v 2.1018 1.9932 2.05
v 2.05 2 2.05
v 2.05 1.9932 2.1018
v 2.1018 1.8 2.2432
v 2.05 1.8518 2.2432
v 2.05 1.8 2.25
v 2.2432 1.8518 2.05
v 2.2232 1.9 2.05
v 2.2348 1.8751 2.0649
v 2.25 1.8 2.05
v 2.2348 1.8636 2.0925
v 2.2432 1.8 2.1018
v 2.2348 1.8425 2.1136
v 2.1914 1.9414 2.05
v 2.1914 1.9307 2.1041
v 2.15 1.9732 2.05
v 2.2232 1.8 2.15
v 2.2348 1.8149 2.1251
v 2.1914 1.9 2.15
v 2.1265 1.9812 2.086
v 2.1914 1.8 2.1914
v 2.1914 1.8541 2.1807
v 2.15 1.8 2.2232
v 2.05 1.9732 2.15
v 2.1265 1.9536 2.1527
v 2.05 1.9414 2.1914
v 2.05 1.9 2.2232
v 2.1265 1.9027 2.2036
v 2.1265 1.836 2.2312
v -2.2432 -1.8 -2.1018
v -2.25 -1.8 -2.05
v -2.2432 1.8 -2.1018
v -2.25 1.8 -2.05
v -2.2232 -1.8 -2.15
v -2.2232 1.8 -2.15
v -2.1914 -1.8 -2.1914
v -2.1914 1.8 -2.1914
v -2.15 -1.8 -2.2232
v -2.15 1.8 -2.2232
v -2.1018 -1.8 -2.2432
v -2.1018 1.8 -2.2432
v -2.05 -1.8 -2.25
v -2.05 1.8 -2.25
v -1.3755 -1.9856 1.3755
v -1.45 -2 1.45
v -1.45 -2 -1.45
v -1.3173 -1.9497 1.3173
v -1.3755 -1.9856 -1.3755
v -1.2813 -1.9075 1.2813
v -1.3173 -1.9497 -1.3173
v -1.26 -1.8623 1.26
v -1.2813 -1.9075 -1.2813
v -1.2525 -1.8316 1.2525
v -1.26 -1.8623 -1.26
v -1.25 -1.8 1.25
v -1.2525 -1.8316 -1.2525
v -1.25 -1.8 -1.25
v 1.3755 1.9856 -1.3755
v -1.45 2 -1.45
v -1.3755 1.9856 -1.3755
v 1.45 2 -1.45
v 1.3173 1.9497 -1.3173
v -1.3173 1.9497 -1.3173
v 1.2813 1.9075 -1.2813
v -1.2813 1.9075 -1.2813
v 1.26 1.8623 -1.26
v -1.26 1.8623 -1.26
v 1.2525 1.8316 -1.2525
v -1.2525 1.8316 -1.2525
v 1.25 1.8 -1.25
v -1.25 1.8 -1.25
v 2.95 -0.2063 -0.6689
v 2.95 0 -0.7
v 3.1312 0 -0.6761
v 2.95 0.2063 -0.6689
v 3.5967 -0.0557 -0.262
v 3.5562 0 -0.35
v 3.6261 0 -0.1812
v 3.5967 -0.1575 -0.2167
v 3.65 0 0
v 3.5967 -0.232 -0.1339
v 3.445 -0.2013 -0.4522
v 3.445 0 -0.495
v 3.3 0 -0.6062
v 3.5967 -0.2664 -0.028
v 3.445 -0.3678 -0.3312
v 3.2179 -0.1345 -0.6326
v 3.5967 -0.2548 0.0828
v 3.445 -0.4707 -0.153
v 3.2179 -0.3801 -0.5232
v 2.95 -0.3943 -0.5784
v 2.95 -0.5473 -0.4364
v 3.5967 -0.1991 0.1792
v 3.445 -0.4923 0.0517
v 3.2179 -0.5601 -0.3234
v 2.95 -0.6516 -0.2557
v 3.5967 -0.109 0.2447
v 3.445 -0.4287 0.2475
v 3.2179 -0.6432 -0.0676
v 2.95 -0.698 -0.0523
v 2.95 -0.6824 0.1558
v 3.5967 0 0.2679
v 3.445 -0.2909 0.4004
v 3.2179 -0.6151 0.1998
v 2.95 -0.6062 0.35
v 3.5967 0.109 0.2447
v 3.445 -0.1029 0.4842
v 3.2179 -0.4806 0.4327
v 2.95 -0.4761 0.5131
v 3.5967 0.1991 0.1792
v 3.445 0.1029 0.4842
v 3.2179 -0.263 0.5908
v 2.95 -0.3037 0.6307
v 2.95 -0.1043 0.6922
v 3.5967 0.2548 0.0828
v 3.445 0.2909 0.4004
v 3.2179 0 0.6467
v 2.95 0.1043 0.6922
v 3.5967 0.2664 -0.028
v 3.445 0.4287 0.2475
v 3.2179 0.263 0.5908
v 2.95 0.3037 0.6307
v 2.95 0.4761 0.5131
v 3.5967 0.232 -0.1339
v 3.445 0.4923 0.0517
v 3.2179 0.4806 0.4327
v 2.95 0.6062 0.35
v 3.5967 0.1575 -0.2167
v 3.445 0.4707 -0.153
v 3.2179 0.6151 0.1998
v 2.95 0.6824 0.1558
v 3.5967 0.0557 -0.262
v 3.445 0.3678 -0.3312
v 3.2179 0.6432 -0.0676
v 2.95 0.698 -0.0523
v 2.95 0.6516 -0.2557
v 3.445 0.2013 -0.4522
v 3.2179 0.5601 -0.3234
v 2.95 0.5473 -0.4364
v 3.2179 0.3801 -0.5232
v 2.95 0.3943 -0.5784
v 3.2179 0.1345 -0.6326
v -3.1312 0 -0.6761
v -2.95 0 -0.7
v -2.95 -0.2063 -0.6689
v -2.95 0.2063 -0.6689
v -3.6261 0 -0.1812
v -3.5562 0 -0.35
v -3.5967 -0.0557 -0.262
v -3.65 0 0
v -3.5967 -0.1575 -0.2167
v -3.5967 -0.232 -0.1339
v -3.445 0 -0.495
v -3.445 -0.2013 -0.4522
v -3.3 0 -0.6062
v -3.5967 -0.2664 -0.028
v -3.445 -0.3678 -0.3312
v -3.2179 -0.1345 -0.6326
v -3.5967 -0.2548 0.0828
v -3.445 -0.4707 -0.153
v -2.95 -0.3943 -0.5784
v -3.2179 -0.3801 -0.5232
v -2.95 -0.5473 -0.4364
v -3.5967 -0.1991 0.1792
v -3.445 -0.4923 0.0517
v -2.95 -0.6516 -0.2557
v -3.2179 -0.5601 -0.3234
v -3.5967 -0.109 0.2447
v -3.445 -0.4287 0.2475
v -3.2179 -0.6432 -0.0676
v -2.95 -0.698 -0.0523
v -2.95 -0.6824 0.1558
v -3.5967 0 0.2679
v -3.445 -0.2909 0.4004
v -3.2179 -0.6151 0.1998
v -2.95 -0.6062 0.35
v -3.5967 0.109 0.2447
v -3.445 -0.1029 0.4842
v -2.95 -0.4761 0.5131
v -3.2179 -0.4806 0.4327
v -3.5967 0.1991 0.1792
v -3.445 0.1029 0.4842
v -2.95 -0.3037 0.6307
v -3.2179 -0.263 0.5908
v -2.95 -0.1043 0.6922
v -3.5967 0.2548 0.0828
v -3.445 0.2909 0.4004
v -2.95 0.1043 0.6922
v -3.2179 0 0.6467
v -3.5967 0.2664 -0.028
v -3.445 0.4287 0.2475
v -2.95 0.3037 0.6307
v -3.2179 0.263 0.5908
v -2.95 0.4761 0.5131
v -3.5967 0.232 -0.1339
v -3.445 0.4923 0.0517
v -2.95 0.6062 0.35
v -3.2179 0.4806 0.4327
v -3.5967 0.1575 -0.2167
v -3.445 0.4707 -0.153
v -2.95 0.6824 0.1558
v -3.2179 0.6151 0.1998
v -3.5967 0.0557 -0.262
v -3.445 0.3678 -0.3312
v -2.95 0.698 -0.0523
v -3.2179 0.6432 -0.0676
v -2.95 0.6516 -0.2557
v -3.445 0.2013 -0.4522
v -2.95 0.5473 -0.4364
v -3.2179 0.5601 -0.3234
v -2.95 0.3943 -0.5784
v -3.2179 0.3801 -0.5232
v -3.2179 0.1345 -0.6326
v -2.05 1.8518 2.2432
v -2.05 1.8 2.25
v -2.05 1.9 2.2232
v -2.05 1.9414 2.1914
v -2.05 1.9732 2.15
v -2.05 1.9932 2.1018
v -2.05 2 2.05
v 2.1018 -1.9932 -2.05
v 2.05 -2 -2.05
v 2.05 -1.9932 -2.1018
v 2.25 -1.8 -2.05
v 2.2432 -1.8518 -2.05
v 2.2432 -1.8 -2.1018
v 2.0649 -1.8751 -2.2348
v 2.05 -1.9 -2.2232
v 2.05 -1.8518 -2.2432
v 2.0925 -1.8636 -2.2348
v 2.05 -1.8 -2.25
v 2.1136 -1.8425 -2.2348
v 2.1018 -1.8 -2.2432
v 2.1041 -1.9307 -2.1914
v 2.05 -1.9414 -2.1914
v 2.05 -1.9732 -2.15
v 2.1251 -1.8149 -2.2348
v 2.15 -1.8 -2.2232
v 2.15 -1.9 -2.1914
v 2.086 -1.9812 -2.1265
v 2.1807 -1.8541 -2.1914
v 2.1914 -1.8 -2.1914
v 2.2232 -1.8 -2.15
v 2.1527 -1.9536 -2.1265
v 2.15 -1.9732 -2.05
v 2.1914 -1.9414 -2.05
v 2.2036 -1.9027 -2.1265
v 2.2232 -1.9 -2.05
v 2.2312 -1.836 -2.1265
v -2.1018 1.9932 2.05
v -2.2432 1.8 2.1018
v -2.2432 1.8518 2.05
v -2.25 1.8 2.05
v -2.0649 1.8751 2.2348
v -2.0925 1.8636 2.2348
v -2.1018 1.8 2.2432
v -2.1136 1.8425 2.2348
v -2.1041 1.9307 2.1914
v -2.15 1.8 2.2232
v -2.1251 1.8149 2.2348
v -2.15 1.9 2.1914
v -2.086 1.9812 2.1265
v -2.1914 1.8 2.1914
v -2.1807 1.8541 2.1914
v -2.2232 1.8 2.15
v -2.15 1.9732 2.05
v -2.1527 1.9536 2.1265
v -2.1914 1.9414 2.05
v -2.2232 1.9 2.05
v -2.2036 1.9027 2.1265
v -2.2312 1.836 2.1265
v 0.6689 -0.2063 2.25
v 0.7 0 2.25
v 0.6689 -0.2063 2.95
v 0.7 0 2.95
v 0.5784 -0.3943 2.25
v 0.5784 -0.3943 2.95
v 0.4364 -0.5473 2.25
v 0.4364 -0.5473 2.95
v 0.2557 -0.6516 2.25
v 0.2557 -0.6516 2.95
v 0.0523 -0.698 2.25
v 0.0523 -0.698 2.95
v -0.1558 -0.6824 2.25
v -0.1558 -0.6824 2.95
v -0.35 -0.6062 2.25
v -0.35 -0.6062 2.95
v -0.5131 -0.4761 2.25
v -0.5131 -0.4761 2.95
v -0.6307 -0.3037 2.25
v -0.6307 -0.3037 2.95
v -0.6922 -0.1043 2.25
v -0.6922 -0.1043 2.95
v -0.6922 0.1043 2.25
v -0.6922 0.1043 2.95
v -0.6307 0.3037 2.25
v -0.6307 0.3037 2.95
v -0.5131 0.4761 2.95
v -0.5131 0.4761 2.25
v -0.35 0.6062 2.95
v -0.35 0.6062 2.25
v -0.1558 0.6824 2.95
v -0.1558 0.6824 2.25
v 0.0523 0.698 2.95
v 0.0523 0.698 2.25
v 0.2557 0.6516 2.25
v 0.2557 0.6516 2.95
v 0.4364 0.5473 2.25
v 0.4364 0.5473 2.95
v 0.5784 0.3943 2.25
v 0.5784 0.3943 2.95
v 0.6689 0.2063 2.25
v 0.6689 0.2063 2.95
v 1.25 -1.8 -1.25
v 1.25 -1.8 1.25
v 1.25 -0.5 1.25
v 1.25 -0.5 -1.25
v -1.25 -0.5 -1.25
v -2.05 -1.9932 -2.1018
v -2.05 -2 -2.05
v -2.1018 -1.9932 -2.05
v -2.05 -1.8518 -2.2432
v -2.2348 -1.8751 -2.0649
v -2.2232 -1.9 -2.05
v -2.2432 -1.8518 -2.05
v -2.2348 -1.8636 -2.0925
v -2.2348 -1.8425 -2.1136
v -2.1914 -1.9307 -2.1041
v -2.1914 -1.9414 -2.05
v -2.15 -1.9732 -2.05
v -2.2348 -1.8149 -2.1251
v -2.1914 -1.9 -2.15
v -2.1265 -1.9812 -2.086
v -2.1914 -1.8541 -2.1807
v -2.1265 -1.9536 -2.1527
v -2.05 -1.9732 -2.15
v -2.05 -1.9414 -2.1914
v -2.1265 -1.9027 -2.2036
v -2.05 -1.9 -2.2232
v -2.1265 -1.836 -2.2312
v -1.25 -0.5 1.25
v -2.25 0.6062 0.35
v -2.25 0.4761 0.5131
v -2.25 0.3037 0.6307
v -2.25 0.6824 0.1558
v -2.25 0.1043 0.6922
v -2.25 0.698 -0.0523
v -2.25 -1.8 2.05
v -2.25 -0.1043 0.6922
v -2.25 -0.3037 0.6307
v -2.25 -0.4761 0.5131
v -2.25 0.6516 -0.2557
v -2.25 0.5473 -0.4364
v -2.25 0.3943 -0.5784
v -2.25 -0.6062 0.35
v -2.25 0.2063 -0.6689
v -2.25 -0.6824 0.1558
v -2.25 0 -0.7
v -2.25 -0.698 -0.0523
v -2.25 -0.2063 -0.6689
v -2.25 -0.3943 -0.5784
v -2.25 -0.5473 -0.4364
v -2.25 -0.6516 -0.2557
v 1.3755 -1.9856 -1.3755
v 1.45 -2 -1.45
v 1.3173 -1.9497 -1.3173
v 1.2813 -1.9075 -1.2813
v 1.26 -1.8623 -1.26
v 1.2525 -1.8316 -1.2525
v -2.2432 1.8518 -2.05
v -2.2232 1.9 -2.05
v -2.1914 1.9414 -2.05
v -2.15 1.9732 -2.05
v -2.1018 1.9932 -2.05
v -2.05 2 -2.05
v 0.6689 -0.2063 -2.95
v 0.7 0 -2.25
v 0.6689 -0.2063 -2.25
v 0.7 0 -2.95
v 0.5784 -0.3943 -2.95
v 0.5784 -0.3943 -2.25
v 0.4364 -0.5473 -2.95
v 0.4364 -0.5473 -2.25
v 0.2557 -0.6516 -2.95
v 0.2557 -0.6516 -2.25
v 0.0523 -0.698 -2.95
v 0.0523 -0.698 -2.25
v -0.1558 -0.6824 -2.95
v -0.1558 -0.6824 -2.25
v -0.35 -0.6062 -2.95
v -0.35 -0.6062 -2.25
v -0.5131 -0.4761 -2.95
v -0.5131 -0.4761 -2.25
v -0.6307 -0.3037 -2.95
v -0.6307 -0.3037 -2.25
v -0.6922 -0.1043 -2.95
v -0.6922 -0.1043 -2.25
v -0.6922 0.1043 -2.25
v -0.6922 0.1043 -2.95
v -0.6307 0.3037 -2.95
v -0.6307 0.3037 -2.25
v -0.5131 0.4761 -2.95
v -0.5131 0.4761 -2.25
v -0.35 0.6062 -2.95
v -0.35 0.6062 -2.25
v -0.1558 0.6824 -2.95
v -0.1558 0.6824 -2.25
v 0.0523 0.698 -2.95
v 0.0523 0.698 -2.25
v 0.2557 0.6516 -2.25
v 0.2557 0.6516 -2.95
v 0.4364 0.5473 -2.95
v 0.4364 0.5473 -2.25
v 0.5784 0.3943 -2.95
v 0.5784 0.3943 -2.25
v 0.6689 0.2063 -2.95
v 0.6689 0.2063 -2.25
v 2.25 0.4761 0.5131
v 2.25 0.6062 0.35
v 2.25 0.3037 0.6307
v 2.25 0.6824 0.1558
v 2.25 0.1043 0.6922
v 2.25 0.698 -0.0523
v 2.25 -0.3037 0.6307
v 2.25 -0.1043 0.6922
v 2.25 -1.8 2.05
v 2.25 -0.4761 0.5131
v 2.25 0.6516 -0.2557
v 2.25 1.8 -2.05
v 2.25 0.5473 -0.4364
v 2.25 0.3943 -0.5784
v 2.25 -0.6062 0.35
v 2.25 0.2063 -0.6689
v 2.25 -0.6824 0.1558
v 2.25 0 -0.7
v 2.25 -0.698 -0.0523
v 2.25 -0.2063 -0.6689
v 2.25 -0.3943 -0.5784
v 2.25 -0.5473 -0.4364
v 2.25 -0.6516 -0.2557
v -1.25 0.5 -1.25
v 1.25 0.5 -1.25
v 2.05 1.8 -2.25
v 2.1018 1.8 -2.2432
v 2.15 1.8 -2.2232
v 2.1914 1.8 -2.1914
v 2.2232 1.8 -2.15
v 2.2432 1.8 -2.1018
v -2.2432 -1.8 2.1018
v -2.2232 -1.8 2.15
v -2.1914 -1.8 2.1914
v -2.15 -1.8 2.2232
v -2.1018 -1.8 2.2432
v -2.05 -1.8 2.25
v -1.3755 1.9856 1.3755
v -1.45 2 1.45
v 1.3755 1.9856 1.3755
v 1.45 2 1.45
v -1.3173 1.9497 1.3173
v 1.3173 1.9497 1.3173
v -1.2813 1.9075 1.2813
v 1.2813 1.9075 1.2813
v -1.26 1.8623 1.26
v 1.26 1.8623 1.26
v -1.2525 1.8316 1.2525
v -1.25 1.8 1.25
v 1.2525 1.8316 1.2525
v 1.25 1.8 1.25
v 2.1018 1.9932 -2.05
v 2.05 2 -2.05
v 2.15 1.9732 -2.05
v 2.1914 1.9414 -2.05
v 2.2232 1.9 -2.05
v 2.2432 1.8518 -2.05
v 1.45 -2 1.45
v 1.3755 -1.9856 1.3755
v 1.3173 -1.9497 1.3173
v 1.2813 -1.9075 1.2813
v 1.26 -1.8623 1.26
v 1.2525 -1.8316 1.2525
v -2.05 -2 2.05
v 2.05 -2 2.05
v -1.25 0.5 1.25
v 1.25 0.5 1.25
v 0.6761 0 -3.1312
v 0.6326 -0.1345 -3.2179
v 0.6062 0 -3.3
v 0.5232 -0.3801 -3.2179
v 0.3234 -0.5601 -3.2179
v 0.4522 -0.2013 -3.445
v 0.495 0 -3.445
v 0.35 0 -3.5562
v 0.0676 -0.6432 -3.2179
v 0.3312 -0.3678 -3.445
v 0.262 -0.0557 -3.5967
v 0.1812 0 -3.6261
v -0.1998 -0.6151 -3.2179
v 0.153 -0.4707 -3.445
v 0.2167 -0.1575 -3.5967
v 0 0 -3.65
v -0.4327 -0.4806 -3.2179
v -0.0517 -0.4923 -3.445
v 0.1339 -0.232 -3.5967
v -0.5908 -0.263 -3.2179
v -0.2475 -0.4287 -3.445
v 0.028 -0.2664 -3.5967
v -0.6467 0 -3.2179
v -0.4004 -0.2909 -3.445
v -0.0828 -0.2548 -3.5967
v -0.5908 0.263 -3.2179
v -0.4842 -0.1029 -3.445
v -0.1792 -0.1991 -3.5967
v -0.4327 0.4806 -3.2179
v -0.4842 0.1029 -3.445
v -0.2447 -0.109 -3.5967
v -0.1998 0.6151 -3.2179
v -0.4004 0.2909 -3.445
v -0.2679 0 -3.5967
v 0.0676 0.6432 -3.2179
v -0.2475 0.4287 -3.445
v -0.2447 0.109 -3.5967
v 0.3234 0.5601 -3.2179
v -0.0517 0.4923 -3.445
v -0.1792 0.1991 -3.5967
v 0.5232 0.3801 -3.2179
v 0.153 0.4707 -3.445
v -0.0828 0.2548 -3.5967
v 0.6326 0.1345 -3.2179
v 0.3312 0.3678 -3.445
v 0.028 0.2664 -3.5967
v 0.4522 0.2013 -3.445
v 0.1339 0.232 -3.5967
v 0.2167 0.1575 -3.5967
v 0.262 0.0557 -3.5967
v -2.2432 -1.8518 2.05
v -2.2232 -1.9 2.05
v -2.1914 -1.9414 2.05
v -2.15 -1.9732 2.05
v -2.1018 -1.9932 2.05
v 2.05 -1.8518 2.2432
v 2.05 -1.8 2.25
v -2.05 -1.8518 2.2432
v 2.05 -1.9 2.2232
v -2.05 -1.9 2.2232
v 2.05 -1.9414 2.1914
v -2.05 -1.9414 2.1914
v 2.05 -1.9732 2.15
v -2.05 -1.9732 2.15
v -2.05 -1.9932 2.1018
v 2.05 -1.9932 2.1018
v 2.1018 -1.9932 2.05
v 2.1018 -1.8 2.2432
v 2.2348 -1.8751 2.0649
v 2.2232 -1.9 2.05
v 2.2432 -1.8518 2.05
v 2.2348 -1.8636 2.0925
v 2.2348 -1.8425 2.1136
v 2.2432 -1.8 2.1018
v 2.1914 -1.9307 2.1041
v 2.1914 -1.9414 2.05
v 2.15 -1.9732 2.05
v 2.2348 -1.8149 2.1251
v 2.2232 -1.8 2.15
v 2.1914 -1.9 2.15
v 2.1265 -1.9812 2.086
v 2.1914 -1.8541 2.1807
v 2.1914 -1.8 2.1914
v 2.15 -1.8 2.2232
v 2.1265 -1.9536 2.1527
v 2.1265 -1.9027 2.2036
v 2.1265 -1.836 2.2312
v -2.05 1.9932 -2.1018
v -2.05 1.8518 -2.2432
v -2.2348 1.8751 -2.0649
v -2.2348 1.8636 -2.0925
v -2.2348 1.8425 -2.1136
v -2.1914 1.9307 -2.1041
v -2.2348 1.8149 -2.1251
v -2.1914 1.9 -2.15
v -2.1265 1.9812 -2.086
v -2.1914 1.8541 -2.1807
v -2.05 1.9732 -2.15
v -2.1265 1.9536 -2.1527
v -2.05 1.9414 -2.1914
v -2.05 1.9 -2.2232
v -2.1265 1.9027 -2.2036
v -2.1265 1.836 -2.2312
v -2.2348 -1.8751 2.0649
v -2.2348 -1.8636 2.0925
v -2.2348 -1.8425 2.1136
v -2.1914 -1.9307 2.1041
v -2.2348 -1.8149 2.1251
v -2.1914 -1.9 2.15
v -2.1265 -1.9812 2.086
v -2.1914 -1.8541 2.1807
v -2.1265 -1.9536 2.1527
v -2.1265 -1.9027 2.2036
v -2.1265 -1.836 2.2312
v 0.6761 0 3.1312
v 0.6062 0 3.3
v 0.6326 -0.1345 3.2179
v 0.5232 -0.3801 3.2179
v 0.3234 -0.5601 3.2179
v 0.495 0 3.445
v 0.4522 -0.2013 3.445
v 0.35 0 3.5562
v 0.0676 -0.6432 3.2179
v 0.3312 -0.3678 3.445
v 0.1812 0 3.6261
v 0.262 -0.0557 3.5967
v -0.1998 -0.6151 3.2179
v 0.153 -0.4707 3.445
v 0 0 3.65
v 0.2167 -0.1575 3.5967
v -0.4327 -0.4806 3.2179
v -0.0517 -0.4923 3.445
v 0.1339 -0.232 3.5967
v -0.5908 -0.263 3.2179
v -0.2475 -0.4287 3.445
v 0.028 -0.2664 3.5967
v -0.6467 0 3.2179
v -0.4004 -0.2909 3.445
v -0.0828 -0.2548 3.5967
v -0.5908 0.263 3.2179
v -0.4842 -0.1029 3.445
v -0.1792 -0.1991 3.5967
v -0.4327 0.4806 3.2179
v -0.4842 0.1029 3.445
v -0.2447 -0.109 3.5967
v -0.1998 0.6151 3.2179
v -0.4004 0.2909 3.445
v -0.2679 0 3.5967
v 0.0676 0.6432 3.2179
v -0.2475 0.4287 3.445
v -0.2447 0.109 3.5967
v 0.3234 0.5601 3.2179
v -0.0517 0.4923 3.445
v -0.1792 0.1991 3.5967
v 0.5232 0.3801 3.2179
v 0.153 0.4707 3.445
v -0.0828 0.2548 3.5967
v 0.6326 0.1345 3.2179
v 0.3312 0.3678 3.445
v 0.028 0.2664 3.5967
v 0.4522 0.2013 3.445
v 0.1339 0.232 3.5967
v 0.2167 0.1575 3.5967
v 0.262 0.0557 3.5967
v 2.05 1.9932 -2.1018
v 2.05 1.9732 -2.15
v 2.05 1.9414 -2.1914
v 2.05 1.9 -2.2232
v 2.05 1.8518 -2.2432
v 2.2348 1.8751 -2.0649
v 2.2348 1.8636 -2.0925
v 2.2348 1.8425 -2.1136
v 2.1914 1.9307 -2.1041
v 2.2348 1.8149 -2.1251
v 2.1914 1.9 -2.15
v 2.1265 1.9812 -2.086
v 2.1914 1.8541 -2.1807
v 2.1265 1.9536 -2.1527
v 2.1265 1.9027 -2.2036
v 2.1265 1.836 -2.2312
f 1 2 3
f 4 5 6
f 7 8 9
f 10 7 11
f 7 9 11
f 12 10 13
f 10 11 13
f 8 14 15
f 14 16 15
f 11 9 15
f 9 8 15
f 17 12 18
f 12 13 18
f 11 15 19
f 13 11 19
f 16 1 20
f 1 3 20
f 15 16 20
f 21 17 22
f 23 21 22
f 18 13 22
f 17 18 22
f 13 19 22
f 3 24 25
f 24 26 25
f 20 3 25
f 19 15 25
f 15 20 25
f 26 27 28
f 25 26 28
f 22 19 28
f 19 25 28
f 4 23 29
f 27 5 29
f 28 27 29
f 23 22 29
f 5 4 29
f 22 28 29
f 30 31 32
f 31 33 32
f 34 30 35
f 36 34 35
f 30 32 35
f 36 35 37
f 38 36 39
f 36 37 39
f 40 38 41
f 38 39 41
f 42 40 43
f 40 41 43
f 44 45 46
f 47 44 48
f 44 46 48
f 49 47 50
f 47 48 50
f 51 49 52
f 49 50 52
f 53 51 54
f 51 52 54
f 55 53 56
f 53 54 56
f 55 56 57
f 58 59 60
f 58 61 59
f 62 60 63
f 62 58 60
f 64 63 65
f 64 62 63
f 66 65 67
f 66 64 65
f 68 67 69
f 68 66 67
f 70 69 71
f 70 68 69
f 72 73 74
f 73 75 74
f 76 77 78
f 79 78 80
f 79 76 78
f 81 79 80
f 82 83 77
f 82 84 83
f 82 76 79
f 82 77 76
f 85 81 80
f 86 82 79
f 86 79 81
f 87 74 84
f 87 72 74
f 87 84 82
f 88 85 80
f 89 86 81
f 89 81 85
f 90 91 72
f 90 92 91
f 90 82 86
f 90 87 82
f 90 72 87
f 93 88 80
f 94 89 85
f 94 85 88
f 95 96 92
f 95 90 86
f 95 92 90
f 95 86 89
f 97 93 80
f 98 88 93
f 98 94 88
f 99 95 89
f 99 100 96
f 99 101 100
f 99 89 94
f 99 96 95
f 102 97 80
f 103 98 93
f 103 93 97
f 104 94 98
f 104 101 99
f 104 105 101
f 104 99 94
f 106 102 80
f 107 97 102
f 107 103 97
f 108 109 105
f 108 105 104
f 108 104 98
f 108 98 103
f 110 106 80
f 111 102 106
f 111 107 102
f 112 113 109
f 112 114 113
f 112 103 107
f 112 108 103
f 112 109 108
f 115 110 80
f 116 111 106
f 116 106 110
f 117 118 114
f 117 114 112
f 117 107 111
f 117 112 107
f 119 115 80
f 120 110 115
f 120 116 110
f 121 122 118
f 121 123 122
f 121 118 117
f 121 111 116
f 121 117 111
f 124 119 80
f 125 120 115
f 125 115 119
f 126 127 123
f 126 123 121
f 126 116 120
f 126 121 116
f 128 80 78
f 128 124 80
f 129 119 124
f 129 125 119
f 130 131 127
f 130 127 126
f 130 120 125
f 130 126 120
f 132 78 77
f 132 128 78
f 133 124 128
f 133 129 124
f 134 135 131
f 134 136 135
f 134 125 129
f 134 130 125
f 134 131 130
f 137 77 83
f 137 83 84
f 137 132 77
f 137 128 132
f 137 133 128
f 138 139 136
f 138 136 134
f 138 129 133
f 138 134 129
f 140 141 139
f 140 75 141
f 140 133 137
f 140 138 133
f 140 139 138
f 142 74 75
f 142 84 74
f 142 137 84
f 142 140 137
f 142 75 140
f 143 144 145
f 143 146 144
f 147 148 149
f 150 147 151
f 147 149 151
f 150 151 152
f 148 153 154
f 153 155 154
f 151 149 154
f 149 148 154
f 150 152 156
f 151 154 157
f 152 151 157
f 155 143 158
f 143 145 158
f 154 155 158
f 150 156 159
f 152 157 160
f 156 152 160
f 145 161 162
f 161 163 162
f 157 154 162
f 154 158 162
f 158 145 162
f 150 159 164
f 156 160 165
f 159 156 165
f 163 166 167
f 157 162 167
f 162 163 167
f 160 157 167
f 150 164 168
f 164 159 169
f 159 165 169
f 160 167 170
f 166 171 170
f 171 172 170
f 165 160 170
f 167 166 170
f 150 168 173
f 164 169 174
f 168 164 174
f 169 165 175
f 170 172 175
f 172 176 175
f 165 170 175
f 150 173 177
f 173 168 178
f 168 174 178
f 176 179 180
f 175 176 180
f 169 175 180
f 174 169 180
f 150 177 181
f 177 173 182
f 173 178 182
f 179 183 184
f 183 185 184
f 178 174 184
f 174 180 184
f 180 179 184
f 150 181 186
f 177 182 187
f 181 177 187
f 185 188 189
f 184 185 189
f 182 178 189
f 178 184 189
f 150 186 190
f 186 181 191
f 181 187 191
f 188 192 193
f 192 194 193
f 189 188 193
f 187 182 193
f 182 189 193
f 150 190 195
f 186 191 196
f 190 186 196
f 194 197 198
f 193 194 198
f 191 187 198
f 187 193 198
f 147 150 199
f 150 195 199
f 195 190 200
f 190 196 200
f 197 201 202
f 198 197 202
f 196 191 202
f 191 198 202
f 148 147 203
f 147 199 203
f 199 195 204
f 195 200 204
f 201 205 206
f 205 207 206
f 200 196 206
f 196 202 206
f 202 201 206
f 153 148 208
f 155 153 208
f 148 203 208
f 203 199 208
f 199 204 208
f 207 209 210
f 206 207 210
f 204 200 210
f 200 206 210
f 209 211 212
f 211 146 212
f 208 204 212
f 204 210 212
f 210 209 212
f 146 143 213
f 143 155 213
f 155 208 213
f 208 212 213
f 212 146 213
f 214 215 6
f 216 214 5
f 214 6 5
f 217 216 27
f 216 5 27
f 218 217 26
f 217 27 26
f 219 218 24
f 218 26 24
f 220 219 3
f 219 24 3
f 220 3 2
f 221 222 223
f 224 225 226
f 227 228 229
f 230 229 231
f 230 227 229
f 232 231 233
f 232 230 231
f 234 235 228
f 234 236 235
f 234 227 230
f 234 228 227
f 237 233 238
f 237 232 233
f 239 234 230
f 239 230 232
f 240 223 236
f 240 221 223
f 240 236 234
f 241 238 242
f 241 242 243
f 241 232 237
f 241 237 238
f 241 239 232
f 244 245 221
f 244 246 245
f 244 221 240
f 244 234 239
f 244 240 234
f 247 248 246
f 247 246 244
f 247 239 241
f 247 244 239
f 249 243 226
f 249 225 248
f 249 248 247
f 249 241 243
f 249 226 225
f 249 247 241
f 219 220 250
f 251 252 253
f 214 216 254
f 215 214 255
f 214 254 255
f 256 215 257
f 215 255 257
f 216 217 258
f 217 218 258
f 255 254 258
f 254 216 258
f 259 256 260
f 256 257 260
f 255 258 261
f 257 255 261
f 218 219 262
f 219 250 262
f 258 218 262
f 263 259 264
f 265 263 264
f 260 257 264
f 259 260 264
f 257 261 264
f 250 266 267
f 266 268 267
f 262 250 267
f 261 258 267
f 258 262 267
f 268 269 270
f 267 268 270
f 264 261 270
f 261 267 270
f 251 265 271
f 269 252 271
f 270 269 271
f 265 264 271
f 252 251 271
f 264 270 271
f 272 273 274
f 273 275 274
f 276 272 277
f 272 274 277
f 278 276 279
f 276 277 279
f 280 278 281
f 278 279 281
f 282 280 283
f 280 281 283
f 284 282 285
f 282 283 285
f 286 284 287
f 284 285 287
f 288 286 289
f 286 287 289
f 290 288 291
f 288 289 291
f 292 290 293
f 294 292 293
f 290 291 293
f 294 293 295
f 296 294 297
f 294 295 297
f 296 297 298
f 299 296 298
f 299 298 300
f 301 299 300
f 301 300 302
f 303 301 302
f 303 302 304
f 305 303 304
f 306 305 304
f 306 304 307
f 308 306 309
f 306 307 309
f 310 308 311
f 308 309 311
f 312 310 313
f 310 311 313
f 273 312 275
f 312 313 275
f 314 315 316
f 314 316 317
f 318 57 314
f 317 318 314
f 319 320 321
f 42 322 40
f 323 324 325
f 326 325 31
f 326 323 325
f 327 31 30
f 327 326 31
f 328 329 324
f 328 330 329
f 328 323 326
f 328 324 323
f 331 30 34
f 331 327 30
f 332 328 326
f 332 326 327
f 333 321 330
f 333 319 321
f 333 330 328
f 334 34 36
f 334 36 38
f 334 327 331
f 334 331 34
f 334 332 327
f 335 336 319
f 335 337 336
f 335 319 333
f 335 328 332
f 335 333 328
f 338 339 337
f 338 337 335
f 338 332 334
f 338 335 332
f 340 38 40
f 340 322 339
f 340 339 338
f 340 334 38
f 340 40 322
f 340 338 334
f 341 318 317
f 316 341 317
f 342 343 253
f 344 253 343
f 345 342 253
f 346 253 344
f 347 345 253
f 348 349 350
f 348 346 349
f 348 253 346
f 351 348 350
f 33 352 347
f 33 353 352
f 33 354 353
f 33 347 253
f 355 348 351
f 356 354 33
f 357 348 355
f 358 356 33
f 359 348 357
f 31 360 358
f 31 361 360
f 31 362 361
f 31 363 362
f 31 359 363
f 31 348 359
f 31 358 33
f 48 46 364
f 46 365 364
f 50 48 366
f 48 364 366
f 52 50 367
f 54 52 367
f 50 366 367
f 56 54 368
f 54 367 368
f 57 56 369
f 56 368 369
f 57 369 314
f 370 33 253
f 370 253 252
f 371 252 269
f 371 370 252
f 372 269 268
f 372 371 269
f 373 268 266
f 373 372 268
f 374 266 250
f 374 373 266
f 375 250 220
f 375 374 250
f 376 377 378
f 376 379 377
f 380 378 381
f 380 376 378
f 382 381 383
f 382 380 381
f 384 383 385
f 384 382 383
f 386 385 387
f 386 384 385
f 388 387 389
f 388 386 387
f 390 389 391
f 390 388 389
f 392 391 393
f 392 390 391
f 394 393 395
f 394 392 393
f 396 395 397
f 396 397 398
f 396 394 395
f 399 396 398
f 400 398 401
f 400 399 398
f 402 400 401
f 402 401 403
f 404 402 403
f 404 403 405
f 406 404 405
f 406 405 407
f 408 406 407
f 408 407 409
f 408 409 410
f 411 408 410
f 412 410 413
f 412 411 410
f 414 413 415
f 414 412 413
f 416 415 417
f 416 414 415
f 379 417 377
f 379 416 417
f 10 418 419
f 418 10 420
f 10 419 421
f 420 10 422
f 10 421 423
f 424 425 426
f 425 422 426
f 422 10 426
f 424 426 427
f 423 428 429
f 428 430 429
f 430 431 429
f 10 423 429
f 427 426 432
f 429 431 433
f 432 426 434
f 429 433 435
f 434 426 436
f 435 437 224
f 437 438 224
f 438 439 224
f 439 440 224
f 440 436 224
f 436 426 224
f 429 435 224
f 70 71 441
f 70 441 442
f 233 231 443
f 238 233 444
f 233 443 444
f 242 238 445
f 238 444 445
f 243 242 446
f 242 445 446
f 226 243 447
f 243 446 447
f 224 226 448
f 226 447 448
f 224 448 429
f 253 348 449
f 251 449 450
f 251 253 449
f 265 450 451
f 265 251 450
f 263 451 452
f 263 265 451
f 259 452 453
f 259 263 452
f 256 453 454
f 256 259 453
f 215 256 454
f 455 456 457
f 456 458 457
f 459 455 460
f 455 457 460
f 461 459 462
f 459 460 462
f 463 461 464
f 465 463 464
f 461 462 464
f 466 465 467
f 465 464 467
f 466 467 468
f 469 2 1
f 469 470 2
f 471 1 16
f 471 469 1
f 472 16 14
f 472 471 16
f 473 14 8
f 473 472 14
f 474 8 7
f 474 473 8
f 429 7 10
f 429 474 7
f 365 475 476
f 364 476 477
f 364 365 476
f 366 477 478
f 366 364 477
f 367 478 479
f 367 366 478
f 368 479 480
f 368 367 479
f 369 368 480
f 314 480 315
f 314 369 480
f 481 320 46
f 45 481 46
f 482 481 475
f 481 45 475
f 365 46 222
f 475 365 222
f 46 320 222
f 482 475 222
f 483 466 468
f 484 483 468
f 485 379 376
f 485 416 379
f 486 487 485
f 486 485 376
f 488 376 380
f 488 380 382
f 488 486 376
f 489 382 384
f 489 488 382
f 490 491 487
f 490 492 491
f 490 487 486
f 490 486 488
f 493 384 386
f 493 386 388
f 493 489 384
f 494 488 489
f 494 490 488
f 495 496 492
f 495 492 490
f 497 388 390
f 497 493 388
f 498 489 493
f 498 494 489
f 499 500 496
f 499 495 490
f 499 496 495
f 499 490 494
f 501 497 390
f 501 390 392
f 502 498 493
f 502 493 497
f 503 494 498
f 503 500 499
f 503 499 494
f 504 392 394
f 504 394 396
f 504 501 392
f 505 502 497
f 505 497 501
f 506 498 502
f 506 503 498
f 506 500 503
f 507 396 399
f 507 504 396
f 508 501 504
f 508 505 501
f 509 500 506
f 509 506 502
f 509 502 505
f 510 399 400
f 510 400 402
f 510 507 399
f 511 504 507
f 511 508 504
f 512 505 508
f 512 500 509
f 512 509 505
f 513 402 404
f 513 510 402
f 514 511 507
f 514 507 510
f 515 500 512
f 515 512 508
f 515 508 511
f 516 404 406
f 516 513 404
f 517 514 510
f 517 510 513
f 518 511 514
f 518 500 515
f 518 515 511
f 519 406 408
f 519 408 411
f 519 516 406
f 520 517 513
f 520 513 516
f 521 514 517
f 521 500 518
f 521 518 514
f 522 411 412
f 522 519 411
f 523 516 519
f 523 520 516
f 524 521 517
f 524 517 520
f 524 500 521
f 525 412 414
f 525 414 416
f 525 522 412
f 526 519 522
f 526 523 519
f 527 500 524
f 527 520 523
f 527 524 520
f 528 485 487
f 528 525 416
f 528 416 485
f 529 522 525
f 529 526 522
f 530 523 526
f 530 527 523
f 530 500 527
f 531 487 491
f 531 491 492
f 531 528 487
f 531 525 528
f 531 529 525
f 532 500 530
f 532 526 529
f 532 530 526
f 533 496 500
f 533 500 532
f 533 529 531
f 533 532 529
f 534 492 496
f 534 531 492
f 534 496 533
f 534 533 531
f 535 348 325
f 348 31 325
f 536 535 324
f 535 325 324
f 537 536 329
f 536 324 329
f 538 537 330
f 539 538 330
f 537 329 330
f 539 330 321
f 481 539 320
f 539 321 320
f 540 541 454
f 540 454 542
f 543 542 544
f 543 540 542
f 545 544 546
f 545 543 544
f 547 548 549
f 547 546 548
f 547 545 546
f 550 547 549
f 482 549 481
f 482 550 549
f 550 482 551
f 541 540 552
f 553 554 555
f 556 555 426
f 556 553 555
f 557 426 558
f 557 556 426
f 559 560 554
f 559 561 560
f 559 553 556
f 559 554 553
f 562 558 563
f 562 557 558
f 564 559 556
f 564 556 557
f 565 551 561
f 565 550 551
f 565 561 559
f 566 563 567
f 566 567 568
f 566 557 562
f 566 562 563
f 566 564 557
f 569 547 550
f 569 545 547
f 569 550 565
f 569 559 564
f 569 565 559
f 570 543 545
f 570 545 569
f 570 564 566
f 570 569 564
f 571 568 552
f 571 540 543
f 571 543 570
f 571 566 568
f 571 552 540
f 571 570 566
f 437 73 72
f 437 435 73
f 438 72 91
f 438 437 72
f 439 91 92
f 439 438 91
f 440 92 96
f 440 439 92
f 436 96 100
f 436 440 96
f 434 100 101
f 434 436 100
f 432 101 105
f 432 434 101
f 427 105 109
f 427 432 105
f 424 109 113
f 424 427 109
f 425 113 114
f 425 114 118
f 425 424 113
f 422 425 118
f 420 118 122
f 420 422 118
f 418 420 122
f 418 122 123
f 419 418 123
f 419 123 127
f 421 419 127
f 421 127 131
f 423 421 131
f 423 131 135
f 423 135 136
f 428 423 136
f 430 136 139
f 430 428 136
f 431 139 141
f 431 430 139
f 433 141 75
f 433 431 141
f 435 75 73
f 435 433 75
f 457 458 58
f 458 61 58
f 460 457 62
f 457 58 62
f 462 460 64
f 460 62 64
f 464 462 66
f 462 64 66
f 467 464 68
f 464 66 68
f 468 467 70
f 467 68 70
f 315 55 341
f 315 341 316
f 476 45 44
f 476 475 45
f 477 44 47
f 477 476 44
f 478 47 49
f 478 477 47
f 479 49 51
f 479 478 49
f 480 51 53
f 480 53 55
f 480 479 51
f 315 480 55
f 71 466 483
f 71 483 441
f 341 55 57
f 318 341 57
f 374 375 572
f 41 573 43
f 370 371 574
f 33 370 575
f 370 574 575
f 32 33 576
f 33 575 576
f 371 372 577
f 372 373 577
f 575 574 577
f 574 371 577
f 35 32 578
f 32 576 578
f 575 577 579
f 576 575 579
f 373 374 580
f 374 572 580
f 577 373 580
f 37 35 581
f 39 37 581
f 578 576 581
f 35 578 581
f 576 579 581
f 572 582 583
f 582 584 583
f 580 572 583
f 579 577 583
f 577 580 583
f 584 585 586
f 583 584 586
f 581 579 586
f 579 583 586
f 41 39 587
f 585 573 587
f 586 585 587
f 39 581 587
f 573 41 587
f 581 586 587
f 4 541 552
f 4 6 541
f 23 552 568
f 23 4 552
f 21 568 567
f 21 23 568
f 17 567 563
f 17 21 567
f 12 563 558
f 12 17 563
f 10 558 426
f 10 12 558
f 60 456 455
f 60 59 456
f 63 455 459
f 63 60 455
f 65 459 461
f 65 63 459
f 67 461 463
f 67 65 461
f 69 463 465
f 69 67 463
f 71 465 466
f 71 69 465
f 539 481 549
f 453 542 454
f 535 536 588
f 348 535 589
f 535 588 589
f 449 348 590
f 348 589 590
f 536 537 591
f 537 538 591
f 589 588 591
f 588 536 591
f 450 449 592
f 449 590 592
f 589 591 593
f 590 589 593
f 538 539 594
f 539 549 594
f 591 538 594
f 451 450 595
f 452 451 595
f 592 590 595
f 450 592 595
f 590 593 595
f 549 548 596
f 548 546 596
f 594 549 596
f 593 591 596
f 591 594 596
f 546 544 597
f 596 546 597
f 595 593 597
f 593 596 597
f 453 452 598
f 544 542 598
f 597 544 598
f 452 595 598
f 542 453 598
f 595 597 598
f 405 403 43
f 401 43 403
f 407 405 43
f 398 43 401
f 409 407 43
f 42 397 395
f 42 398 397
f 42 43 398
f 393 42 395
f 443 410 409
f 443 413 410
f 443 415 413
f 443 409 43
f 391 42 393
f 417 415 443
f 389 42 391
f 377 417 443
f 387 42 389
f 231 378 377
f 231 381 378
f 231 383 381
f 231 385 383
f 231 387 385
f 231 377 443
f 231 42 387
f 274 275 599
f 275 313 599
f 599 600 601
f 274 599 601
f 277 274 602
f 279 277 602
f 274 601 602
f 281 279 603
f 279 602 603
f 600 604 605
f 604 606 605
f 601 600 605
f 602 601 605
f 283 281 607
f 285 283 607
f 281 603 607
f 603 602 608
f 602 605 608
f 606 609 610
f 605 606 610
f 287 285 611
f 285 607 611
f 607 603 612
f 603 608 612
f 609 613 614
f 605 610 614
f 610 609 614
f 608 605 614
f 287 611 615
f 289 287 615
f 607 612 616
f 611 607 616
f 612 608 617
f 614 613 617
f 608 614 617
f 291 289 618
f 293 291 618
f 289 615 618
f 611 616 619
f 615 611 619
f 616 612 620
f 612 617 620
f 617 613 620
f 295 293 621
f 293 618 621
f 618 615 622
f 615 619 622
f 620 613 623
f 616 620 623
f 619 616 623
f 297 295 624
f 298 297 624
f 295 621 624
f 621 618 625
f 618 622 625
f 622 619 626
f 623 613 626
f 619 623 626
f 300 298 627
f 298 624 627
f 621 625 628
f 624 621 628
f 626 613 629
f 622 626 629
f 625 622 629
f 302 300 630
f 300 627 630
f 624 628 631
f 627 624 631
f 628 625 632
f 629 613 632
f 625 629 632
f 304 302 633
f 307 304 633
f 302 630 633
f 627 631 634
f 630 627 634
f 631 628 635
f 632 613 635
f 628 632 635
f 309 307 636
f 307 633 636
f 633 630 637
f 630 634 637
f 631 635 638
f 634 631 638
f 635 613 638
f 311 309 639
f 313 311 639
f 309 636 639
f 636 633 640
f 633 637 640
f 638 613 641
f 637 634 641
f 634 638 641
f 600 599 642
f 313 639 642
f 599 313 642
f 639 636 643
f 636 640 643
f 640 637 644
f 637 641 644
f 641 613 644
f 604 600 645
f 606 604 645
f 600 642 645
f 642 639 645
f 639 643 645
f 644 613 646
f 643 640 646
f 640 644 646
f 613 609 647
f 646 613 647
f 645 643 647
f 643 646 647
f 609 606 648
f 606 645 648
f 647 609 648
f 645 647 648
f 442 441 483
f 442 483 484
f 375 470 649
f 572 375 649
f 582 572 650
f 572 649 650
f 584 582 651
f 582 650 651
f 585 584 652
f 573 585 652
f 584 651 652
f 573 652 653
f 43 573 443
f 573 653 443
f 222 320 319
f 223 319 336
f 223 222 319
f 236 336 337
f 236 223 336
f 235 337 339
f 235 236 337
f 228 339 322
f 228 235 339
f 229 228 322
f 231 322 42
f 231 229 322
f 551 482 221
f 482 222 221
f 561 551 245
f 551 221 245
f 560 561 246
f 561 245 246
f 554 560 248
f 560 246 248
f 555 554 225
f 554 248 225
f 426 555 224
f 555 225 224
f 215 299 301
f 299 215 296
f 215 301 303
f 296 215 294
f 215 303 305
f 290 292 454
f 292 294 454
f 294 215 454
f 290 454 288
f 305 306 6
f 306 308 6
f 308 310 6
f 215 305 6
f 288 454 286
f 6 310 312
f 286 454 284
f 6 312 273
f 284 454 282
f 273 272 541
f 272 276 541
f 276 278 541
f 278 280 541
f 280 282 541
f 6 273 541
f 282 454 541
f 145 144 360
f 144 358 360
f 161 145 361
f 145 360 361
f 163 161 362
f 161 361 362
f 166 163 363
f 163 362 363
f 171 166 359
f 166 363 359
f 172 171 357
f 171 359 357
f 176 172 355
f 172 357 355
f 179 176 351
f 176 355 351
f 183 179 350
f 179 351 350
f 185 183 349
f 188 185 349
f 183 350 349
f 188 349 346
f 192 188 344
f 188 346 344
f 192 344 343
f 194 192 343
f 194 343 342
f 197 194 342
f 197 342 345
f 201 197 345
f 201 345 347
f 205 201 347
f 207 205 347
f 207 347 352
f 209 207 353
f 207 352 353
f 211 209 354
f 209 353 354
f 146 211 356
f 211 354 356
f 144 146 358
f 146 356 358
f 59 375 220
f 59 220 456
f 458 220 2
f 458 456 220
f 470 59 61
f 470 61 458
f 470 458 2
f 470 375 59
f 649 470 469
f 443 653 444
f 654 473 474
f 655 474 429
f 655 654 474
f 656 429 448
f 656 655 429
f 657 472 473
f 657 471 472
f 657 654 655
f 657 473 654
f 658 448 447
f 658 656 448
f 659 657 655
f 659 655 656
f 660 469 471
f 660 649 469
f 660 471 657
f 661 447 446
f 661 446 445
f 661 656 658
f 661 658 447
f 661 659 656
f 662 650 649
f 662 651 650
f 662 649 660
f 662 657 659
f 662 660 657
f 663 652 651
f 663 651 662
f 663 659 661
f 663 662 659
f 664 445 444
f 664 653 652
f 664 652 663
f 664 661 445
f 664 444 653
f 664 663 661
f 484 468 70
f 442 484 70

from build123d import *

# Parameters (mm, degrees)
EXTRUDE_1_DEPTH      = 2
EXTRUDE_1_DEPTH_BACK = 2
SKETCH_1_W           = 4.5
SKETCH_1_H           = 4.5
SKETCH_2_W           = 2.5
SKETCH_2_H           = 2.5
CUT_EXTRUDE_1_DEPTH  = 1.5
FILLET_1_R           = 0.2


with BuildPart() as part:
    # 草图1 → 凸台-拉伸1 (new, two sides: drawn at the far end of the back side and taken through both)
    with BuildSketch(Plane(origin=(0, 0, 0), x_dir=(1, 0, 0), z_dir=(0, 1, 0)).offset(-EXTRUDE_1_DEPTH_BACK)):
        Rectangle(SKETCH_1_W, SKETCH_1_H)
    extrude(amount=EXTRUDE_1_DEPTH + EXTRUDE_1_DEPTH_BACK)

    # 草图2 → 切除-拉伸1 (cut)
    with BuildSketch(Plane(origin=(0, 2, 0), x_dir=(1, 0, 0), z_dir=(0, 1, 0))):
        Rectangle(SKETCH_2_W, SKETCH_2_H)
    cut_extrude_1 = extrude(amount=-CUT_EXTRUDE_1_DEPTH, mode=Mode.SUBTRACT)

    # 镜向1: 切除-拉伸1 across plane
    add(cut_extrude_1.mirror(Plane.ZX), mode=Mode.SUBTRACT)

    # 草图3 → 旋转1 (revolve)
    with BuildSketch(Plane(origin=(0, 0, 0), x_dir=(1, 0, 0), z_dir=(0, 1, 0))):
        with BuildLine():
            Line((0, 2.25), (-0.7, 2.25))
            Line((-0.7, 2.25), (-0.7, 2.95))
            ThreePointArc((-0.7, 2.95), (-0.494974747, 3.444974747), (0, 3.65))
            Line((0, 3.65), (0, 2.95))
            Line((0, 2.95), (0, 2.25))
        make_face()
    revolve_1 = revolve(axis=Axis((0, 0, -2.95), (0, 0, -1)))

    # 镜向2: 旋转1 across plane
    add(revolve_1.mirror(Plane.XY))

    # 草图5 → 旋转2 (revolve)
    with BuildSketch(Plane(origin=(0, 0, 0), x_dir=(1, 0, 0), z_dir=(0, 1, 0))):
        with BuildLine():
            Line((-2.25, 0), (-2.95, 0))
            Line((-2.95, 0), (-3.65, 0))
            ThreePointArc((-3.65, 0), (-3.444974747, 0.494974747), (-2.95, 0.7))
            Line((-2.95, 0.7), (-2.25, 0.7))
            Line((-2.25, 0.7), (-2.25, 0))
        make_face()
    revolve_2 = revolve(axis=Axis((-2.25, 0, 0), (-1, 0, 0)))

    # 镜向3: 旋转2 across plane
    add(revolve_2.mirror(Plane(origin=(0, 0, 0), x_dir=(0, 0, 1), z_dir=(1, 0, 0))))

    # 圆角1
    fillet_1_edges = [part.edges().sort_by_distance(p)[0] for p in [
        (1.25, -2, 0),
        (0, -2, 1.25),
        (-1.25, -2, 0),
        (0, -2, -1.25),
        (-2.25, -2, 0),
        (0, -2, 2.25),
        (2.25, -2, 0),
        (0, -2, -2.25),
        (2.25, 2, 0),
        (0, 2, 2.25),
        (-2.25, 2, 0),
        (0, 2, -2.25),
        (-1.25, 2, 0),
        (0, 2, 1.25),
        (1.25, 2, 0),
        (0, 2, -1.25),
        (-2.25, 0, 2.25),
        (2.25, 0, 2.25),
        (-2.25, 0, -2.25),
        (2.25, 0, -2.25),
    ]]
    fillet(fillet_1_edges, radius=FILLET_1_R)


solid = part.part
